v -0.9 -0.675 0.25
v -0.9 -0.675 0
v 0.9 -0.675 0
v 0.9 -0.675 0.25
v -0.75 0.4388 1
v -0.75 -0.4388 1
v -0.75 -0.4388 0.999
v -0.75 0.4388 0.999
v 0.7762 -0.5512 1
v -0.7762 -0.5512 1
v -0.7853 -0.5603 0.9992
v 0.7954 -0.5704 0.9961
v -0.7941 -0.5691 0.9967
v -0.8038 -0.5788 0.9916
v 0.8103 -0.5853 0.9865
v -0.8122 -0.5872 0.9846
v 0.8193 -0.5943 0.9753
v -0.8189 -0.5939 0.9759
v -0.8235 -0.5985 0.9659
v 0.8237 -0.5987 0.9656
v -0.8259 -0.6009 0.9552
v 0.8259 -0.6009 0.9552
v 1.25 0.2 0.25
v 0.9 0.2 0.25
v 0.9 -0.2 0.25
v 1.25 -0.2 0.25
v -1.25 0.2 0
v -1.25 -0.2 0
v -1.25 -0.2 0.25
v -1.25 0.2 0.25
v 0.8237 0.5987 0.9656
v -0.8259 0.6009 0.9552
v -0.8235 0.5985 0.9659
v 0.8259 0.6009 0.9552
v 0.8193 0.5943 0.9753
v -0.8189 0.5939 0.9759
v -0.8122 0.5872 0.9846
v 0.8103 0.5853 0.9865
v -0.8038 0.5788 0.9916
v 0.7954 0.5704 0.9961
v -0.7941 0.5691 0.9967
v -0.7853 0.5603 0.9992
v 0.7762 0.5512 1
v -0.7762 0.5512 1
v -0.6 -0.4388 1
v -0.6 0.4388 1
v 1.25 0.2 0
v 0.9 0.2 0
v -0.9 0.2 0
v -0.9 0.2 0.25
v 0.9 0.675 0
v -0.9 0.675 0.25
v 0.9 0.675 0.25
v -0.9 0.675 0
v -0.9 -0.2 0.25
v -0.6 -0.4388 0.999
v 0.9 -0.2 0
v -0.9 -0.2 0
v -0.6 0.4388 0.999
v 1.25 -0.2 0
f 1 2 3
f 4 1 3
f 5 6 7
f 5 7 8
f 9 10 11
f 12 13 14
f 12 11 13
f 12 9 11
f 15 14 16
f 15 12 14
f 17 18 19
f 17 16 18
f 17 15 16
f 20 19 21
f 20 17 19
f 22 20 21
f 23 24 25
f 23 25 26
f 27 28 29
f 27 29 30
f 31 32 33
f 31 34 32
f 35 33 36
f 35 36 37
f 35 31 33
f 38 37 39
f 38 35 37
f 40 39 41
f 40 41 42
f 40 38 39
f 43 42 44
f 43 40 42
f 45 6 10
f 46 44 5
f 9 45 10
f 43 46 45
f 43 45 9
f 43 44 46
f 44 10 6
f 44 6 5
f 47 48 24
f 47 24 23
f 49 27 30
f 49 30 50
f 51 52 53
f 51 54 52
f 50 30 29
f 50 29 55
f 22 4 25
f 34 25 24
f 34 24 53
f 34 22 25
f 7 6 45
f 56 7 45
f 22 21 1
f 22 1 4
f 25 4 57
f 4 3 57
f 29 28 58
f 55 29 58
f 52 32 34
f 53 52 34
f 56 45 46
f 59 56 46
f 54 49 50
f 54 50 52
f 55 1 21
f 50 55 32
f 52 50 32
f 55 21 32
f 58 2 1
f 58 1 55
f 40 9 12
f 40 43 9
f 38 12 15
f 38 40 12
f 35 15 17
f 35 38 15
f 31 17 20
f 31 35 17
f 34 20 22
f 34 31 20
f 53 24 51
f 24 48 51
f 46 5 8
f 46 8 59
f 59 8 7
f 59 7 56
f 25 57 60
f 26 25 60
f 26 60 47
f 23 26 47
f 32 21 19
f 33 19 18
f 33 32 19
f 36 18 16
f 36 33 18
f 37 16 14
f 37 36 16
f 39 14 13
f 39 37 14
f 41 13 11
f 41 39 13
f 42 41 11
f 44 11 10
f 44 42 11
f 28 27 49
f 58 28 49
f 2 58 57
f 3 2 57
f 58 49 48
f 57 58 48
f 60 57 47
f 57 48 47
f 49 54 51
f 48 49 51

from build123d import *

# Parameters (mm, degrees)
SKBODY_W              = 1.8
SKBODY_H              = 1.35
BOSS_BODY_DEPTH       = 1
CHAMFER1_SIZE         = 0.75
CHAMFER1_SIZE2        = 0.078828176
CHAMFER1_PART_2_SIZE  = 0.75
CHAMFER1_PART_2_SIZE2 = 0.078828176
CHAMFER1_PART_3_SIZE  = 0.75
CHAMFER1_PART_3_SIZE2 = 0.078828176
CHAMFER1_PART_4_SIZE  = 0.75
CHAMFER1_PART_4_SIZE2 = 0.078828176
FILLET1_R             = 0.05
SKPOLARITY_W          = 0.15
SKPOLARITY_H          = 0.8775
CUT_PMARK_DEPTH       = 0.001
SKLEADS_W             = 0.35
SKLEADS_H             = 0.4
BOSS_LEADS_DEPTH      = 0.25


with BuildPart() as part:
    # SkBody → Boss-Body (new body)
    with BuildSketch(Plane.XY):
        Rectangle(SKBODY_W, SKBODY_H)
    extrude(amount=BOSS_BODY_DEPTH)

    # Chamfer1
    chamfer1_edges = [part.edges().sort_by_distance(p)[0] for p in [
        (-0.9, 0, 1),
    ]]
    chamfer1_side = [part.faces().sort_by_distance(p)[0] for p in [
        (-0.9, 0, 0.5),
    ]]
    chamfer(chamfer1_edges, length=CHAMFER1_SIZE, length2=CHAMFER1_SIZE2, reference=chamfer1_side[0])

    # Chamfer1 part 2
    chamfer1_part_2_edges = [part.edges().sort_by_distance(p)[0] for p in [
        (0, -0.675, 1),
    ]]
    chamfer1_part_2_side = [part.faces().sort_by_distance(p)[0] for p in [
        (0, -0.675, 0.5),
    ]]
    chamfer(chamfer1_part_2_edges, length=CHAMFER1_PART_2_SIZE, length2=CHAMFER1_PART_2_SIZE2, reference=chamfer1_part_2_side[0])

    # Chamfer1 part 3
    chamfer1_part_3_edges = [part.edges().sort_by_distance(p)[0] for p in [
        (0.9, 0, 1),
    ]]
    chamfer1_part_3_side = [part.faces().sort_by_distance(p)[0] for p in [
        (0.9, 0, 0.5),
    ]]
    chamfer(chamfer1_part_3_edges, length=CHAMFER1_PART_3_SIZE, length2=CHAMFER1_PART_3_SIZE2, reference=chamfer1_part_3_side[0])

    # Chamfer1 part 4
    chamfer1_part_4_edges = [part.edges().sort_by_distance(p)[0] for p in [
        (0, 0.675, 1),
    ]]
    chamfer1_part_4_side = [part.faces().sort_by_distance(p)[0] for p in [
        (0, 0.675, 0.5),
    ]]
    chamfer(chamfer1_part_4_edges, length=CHAMFER1_PART_4_SIZE, length2=CHAMFER1_PART_4_SIZE2, reference=chamfer1_part_4_side[0])

    # Fillet1
    fillet1_edges = [part.edges().sort_by_distance(p)[0] for p in [
        (0.821171824, 0, 1),
        (0, 0.596171824, 1),
        (-0.821171824, 0, 1),
        (0, -0.596171824, 1),
    ]]
    fillet(fillet1_edges, radius=FILLET1_R)

    # SkPolarity → Cut-PMark (cut)
    with BuildSketch(Plane.XY.offset(1)):
        with Locations((-0.675, 0)):
            Rectangle(SKPOLARITY_W, SKPOLARITY_H)
    extrude(amount=-CUT_PMARK_DEPTH, mode=Mode.SUBTRACT)

    # SkLeads → Boss-Leads (add)
    with BuildSketch(Plane.XY):
        with Locations((1.075, 0)):
            Rectangle(SKLEADS_W, SKLEADS_H)
        with Locations((-1.075, 0)):
            Rectangle(SKLEADS_W, SKLEADS_H)
    extrude(amount=BOSS_LEADS_DEPTH)


solid = part.part
